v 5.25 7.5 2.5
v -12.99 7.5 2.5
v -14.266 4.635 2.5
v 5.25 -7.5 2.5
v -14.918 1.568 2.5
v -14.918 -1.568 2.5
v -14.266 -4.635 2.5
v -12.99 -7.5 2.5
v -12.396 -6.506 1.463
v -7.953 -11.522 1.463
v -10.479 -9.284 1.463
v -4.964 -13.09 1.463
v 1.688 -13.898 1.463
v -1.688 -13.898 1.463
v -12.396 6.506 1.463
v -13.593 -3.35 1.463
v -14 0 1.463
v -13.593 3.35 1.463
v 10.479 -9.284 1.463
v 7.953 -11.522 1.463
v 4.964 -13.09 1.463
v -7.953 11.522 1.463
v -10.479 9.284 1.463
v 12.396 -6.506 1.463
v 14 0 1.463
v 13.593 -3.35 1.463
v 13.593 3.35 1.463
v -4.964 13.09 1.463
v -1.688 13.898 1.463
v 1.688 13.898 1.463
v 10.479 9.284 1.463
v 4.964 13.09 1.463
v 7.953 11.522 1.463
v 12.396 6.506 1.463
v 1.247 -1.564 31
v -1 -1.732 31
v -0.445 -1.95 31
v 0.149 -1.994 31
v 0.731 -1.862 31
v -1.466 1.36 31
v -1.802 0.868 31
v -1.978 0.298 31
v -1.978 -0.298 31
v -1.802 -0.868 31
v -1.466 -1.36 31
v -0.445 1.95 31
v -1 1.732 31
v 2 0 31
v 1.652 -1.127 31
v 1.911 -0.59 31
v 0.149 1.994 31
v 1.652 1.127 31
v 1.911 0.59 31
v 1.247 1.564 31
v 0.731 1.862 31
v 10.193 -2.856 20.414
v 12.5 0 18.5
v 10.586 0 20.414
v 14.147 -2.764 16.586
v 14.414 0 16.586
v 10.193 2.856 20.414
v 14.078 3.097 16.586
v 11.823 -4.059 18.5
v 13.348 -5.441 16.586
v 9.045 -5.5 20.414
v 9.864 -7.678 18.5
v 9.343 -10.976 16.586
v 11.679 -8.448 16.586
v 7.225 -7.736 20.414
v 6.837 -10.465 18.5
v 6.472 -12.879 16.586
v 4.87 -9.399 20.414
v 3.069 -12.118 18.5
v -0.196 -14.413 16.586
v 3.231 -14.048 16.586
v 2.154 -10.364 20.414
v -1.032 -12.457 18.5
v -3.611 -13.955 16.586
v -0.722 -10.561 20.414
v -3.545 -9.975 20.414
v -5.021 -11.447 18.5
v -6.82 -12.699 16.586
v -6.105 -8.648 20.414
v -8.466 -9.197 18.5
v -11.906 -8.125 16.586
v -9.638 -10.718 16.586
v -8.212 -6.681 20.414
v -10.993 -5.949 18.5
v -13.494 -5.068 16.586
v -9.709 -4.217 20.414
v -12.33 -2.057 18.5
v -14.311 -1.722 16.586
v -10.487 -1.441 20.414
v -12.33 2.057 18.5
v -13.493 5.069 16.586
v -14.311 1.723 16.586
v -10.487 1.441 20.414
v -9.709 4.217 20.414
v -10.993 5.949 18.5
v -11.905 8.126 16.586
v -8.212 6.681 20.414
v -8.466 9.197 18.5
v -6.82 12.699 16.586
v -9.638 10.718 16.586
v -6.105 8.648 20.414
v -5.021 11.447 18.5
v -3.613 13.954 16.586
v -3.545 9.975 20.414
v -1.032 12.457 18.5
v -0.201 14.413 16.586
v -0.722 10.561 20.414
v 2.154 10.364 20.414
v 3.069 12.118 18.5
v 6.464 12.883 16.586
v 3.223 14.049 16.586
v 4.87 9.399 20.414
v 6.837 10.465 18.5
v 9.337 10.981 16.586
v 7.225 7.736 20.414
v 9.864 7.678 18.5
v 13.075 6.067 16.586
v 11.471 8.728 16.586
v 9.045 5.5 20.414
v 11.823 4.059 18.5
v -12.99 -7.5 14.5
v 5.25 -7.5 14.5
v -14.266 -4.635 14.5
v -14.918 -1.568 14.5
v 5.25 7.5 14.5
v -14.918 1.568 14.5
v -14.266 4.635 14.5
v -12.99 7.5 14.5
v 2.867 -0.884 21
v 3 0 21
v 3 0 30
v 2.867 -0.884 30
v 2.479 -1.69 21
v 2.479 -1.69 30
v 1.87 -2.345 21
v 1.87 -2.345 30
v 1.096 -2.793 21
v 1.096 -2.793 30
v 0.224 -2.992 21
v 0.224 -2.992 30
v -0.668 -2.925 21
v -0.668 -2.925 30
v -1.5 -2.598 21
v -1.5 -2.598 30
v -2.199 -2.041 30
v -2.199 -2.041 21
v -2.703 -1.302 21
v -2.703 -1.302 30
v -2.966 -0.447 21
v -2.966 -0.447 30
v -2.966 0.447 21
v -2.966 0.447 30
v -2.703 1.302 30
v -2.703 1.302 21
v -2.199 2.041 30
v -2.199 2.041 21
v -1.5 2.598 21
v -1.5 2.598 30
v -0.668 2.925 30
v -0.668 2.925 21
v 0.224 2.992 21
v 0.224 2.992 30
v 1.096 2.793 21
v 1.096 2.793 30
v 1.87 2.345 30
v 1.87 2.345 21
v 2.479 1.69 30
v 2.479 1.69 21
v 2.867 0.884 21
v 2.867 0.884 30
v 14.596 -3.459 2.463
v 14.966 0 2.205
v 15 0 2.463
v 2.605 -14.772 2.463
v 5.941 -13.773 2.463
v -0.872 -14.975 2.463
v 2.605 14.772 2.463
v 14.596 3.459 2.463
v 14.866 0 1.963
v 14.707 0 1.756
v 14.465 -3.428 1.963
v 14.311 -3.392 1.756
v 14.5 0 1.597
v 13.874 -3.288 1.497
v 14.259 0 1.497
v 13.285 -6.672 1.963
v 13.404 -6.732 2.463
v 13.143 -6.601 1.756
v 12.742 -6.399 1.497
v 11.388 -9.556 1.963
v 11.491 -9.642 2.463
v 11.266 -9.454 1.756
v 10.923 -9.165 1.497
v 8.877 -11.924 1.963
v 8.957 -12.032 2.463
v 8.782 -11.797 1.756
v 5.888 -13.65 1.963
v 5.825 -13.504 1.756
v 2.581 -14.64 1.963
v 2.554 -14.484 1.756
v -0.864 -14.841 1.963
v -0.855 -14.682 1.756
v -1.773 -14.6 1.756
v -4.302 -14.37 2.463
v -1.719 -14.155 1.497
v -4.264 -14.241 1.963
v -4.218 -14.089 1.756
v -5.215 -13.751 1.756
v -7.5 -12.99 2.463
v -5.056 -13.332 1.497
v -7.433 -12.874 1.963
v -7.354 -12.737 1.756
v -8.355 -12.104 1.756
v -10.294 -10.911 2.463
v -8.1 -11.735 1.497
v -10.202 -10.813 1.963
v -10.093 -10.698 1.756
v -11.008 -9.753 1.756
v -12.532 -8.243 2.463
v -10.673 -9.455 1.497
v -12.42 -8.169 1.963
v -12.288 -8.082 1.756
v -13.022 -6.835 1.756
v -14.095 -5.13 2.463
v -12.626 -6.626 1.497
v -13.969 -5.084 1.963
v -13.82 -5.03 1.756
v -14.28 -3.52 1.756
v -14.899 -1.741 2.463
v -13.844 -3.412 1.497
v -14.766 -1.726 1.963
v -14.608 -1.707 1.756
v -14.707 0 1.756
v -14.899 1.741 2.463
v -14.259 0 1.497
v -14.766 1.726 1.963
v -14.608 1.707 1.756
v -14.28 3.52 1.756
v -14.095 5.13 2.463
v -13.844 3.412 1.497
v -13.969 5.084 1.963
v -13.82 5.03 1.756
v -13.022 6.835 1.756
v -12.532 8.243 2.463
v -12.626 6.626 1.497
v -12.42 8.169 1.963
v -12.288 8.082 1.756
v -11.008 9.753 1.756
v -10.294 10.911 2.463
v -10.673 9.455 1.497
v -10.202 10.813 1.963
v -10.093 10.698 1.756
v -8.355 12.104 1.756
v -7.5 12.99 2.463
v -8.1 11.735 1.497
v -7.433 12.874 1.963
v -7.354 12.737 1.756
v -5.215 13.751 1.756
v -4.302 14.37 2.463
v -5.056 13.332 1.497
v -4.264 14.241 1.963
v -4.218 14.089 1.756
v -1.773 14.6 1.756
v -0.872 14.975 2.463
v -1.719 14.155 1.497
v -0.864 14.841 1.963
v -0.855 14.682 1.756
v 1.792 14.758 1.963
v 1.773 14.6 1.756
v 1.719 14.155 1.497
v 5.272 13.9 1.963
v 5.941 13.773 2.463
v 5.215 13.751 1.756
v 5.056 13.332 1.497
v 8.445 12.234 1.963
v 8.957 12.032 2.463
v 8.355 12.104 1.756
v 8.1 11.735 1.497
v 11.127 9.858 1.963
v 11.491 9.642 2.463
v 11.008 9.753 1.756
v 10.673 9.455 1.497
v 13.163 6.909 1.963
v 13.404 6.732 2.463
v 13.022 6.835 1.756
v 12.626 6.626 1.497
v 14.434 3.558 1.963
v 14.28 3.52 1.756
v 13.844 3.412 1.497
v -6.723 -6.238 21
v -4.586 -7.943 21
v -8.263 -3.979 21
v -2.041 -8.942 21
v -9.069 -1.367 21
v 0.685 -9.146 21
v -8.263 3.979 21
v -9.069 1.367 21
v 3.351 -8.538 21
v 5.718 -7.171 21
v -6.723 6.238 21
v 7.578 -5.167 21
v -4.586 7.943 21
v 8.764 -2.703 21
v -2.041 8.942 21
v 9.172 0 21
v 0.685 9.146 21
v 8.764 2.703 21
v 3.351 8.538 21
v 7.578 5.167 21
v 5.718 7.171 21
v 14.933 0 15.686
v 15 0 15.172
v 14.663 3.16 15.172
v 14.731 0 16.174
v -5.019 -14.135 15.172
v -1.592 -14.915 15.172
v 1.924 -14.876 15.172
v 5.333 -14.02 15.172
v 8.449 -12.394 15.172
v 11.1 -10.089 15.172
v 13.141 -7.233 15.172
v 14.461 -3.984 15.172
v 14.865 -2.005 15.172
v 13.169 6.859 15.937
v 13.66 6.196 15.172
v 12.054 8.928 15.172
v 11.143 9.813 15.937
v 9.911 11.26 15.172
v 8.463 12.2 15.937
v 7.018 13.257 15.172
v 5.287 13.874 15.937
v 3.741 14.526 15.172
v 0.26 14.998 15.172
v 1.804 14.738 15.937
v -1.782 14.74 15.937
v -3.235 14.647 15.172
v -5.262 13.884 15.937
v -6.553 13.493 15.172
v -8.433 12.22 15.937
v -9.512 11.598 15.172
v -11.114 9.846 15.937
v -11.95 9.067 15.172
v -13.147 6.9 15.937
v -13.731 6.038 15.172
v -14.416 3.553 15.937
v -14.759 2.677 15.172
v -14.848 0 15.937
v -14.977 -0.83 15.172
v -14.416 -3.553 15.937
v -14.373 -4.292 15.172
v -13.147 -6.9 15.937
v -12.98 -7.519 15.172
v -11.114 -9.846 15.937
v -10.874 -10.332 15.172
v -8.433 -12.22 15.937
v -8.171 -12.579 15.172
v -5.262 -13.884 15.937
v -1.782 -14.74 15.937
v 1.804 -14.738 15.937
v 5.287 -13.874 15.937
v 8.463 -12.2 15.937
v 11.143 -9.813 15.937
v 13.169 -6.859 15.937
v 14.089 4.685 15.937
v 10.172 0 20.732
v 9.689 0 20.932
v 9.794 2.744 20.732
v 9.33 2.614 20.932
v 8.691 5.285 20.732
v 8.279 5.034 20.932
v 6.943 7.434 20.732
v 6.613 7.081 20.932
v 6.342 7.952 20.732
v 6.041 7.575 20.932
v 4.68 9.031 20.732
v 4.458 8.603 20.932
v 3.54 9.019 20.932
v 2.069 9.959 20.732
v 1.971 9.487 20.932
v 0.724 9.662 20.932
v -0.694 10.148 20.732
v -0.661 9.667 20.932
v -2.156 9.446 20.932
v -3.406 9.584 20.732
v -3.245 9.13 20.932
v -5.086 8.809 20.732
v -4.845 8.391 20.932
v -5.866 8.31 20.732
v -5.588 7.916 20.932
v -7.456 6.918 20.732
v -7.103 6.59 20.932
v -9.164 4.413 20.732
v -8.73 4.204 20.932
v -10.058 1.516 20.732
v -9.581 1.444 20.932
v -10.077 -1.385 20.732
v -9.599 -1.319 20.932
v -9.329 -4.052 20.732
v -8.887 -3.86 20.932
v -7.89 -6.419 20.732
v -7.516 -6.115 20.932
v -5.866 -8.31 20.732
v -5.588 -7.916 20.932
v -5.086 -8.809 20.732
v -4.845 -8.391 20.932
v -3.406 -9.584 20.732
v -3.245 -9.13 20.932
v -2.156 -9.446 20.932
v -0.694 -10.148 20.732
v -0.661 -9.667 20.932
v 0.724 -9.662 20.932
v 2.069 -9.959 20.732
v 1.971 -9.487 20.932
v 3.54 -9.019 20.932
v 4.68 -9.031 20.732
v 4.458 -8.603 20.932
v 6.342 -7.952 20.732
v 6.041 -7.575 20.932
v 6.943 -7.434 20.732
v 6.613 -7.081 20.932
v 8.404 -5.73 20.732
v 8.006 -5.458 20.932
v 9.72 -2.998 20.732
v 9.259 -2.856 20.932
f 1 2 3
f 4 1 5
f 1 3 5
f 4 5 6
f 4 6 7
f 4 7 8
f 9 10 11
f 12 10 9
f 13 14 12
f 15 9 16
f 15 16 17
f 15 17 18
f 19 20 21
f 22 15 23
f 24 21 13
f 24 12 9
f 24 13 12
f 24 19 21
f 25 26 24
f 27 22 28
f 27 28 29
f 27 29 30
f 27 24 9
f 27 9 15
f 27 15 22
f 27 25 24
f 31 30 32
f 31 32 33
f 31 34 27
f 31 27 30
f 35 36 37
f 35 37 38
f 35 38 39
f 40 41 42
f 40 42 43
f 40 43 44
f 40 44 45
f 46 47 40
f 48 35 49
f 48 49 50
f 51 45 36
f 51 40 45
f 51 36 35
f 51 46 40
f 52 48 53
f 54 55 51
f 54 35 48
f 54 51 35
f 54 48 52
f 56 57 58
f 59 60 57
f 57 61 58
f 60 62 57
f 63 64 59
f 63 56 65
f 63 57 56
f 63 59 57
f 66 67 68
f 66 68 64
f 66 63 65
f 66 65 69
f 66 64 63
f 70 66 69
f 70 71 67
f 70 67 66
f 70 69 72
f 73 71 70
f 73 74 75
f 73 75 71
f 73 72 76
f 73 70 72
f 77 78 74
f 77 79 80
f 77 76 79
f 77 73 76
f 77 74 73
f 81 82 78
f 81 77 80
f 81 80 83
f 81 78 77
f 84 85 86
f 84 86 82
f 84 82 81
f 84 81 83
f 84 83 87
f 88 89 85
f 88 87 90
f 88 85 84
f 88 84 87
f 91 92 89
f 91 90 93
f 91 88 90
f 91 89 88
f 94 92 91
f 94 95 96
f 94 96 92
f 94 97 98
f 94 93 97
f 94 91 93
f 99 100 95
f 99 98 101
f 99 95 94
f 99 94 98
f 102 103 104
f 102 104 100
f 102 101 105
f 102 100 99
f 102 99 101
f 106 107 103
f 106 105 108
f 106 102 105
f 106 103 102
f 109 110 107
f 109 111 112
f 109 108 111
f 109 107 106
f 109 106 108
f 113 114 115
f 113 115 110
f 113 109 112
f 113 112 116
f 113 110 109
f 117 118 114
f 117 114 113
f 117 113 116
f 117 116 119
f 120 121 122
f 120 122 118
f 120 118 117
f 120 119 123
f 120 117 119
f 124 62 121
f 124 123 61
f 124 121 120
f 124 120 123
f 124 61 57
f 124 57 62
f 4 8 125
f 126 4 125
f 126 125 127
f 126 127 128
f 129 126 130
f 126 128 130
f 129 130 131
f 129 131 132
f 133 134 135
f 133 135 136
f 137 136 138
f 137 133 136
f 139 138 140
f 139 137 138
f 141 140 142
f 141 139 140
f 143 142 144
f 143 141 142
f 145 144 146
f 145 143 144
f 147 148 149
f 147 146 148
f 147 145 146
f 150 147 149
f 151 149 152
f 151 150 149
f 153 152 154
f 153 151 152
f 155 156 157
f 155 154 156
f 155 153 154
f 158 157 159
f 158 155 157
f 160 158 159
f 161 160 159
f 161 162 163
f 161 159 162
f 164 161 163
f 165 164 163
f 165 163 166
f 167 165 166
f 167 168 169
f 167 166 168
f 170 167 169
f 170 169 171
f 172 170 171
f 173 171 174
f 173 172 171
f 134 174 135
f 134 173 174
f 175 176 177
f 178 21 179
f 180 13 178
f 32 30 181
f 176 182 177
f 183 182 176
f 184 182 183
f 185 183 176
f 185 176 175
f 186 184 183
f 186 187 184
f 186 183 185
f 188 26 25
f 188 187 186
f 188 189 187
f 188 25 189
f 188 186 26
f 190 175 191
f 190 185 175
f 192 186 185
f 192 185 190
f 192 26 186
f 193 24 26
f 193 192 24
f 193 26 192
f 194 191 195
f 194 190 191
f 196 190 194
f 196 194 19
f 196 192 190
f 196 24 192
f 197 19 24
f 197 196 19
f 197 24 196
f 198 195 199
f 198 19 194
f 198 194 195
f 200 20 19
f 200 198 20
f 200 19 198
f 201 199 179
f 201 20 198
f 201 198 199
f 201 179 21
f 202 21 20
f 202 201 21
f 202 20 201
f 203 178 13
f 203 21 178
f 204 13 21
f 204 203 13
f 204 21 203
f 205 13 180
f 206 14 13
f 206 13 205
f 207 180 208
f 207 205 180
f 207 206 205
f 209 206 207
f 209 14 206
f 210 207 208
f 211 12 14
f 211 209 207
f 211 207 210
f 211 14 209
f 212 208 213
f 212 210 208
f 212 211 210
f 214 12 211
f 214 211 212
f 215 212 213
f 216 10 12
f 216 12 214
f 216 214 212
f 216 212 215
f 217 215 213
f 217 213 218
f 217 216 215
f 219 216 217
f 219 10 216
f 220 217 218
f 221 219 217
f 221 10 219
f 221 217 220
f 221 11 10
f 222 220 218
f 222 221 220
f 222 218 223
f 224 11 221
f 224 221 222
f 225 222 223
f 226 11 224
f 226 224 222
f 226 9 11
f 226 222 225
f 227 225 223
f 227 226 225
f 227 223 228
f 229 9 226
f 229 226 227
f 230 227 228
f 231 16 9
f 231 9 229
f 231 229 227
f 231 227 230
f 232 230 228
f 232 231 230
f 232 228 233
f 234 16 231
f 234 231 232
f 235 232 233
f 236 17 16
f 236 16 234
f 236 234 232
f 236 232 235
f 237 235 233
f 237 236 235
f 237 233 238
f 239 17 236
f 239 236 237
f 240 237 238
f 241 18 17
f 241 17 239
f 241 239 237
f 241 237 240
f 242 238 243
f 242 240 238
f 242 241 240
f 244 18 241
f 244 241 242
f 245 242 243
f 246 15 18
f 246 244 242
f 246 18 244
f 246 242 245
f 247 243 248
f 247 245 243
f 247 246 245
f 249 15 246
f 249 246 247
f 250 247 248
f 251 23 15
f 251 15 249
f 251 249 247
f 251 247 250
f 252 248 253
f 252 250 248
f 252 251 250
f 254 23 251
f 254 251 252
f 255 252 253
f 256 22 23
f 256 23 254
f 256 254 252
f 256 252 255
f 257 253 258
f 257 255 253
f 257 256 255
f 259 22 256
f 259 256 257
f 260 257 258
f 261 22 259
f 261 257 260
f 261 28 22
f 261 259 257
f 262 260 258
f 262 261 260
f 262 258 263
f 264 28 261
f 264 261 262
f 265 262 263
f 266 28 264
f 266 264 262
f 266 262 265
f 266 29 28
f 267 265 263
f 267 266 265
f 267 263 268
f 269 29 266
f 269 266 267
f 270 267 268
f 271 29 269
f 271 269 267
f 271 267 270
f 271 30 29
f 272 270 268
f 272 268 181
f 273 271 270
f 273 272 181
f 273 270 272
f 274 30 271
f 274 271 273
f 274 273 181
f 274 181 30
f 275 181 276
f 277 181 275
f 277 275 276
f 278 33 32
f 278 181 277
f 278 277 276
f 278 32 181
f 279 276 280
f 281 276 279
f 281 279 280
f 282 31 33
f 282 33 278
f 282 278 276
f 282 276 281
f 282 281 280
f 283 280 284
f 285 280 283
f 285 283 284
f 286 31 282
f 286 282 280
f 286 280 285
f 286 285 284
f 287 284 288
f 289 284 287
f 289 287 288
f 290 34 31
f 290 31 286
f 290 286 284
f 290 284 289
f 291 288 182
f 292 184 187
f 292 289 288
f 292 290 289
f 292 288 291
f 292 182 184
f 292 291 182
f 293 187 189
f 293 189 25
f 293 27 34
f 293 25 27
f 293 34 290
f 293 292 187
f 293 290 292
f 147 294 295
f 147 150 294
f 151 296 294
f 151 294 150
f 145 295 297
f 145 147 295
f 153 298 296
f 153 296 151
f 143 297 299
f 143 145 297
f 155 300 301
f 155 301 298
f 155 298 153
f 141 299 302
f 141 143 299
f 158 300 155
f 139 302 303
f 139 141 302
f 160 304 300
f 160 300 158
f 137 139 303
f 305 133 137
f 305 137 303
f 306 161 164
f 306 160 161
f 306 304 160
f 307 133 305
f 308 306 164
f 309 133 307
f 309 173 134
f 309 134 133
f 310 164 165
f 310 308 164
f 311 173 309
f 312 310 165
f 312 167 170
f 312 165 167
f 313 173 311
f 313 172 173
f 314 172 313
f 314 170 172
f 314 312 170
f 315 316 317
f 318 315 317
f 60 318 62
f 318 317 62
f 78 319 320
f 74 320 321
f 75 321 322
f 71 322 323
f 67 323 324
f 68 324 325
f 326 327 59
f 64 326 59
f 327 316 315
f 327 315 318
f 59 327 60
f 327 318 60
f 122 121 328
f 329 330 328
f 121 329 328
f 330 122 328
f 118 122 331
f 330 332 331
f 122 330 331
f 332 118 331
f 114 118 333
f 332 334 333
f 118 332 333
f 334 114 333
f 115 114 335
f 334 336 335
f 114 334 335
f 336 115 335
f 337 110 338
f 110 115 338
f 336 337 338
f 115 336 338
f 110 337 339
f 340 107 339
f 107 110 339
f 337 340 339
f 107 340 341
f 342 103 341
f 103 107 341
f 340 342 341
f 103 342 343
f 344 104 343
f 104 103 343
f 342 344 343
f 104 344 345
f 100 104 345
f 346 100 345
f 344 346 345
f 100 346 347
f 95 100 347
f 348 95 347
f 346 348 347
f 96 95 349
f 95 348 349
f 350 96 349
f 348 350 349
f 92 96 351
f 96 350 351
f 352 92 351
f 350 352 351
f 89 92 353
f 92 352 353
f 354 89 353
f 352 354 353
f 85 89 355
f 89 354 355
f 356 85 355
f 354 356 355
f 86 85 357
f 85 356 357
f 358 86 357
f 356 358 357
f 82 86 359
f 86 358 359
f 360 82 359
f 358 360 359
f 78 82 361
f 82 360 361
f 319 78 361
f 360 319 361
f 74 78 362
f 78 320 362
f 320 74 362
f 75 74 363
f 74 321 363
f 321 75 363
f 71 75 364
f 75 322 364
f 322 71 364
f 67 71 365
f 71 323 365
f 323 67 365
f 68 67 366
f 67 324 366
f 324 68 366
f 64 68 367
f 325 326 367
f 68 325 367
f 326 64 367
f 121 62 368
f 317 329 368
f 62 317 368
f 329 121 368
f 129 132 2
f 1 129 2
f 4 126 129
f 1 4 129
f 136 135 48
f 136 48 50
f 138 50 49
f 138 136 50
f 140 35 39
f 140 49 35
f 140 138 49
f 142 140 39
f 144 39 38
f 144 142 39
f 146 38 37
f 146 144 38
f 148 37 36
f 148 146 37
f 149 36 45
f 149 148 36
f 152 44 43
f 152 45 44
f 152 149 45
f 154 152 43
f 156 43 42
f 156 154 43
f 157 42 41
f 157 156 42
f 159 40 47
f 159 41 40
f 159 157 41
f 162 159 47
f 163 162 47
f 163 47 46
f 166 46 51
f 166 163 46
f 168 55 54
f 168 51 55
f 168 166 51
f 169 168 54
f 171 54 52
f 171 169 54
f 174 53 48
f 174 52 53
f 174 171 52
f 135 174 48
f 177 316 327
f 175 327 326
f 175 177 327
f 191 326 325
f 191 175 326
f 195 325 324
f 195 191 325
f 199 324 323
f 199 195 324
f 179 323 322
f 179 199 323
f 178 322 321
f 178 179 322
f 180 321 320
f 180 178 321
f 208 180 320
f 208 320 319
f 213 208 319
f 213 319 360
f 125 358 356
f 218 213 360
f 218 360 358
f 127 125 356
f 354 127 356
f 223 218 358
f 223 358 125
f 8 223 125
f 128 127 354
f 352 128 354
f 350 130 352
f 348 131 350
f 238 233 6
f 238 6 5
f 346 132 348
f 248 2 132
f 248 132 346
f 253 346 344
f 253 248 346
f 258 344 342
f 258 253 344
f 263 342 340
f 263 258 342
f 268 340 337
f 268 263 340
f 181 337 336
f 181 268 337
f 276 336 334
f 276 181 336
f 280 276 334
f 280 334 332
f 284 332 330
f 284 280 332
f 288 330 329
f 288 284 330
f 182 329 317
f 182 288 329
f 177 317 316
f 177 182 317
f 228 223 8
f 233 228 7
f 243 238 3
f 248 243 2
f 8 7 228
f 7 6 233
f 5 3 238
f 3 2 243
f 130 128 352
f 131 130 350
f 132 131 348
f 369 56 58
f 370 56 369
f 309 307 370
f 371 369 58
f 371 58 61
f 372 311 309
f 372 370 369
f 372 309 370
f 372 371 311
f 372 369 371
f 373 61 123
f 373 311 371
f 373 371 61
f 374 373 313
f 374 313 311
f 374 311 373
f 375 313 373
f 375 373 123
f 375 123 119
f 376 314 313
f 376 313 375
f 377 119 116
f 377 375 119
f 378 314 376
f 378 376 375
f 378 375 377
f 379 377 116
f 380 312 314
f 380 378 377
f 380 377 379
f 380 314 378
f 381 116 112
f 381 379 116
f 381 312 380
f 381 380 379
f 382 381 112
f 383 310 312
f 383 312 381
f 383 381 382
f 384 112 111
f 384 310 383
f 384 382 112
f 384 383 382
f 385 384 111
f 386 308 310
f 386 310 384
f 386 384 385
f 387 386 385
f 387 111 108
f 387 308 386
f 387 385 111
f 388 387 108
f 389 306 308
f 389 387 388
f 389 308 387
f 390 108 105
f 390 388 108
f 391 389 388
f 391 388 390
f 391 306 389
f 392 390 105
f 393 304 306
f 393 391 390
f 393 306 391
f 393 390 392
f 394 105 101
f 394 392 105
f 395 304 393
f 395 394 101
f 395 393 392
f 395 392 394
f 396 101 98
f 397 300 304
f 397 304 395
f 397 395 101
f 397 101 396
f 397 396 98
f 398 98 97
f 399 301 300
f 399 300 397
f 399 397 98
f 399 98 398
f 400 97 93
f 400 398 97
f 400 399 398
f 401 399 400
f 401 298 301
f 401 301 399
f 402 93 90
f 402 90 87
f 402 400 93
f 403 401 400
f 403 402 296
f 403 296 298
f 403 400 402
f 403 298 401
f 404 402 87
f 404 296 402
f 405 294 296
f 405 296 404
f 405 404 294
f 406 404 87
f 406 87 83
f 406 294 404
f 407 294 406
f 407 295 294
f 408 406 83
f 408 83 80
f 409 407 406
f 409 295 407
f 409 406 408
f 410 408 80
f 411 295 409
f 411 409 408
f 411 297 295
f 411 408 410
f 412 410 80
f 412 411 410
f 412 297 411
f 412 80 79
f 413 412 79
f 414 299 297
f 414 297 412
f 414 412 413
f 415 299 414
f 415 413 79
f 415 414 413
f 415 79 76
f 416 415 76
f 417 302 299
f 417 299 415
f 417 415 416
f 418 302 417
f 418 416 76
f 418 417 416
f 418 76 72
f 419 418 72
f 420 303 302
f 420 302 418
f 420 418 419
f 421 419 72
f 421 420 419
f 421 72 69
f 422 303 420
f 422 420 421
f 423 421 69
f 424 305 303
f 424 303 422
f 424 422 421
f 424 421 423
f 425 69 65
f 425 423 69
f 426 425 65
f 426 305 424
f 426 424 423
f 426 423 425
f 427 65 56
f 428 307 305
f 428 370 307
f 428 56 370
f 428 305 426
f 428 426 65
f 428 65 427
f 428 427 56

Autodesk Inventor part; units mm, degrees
ref_plane "XY Plane" through (0, 0, 0) normal (0, 0, 1) x (1, 0, 0)
sketch "Sketch1" plane through (0, 0, 0) normal (0, 0, 1) x (1, 0, 0)
  circle A0 centre (0, 0) radius 15
  dimension "d0" = 30
extrude "Extrusion1" add sketch "Sketch1" along normal blind 20
sketch "Sketch3" plane through (0, 0, 20) normal (0, 0, 1) x (1, 0, 0)
  circle A0 centre (0, 0) radius 15
extrude "Extrusion3" add sketch "Sketch3" along normal blind 1
chamfer "Chamfer1" distance 5 angle 45 1 edges at (-15, 0, 21)
fillet "Fillet1" radius 2 2 edges at (-15, 0, 16) (-10, 0, 21)
sketch "Sketch4" plane through (0, 0, 21) normal (0, 0, 1) x (1, 0, 0)
  circle A0 centre (0, 0) radius 3
  dimension "d12" = 6
extrude "Extrusion4" add sketch "Sketch4" along normal blind 10
chamfer "Chamfer2" distance 1 angle 45 1 edges at (-3, 0, 31)
fillet "Fillet2" radius 1 1 edges at (-15, 0, 0)
ref_plane "Work Plane2" through (0, 14.5, 0) normal (0, 1, 0) x (-1, 0, 0)
ref_plane "Work Plane1" through (0, -15.5, 0) normal (0, 1, 0) x (-1, 0, 0)
ref_plane "Work Plane3" through (-14.75, 0, 0) normal (1, 0, 0) x (0, 1, 0)
sketch "Sketch5" plane through (-14.75, 0, 0) normal (1, 0, 0) x (0, 1, 0)
  line L0 (7.5, 2.5) -> (-7.5, 2.5)
  line L1 (-7.5, 2.5) -> (-7.5, 14.5)
  line L2 (-7.5, 14.5) -> (7.5, 14.5)
  line L3 (7.5, 14.5) -> (7.5, 2.5)
  line L4 (9.8328, 18.3373) -> (9.8328, 18.1192)
  line L5 (7.5, 12.0972) -> (7.5, 12.3154)
  line L6 (-15, 1) -> (15, 1) projected
  line L7 (15, 1) -> (15, 15.1716) projected
  line L8 (-15, 1) -> (15, 1)
  line L9 (15, 1) -> (15, 15.1716)
  line L10 (15, 15.1716) -> (-15, 15.1716)
  line L11 (-15, 15.1716) -> (-15, 1)
  line L12 (15, 15.1716) -> (-15, 15.1716) projected
  point P0 (0, 0)
  dimension "d28" = 15
  dimension "d29" = 12
  dimension "d30" = 7.5
  dimension "d31" = 7.5
  dimension "d32" = 1.5
  dimension "d34" = 0
extrude "Extrusion5" cut sketch "Sketch5" along normal blind 20 and the other way blind 5 contours L0 L1 L2 L3
thread "Thread1" size "M6x1" class "6g" standard "ANSI Metric M Profile" full length
sketch "Sketch6" plane through (5.25, 0, 0) normal (-1, 0, 0) x (0, 0, 1)
  line L0 (0, -16.1407) -> (1.4634, -16.1407)
  line L1 (1.4634, -16.1407) -> (1.4634, 17.2598)
  line L2 (1.4634, 17.2598) -> (0, 17.2598)
  line L3 (0, 17.2598) -> (0, -16.1407)
  point P0 (0, 0)
extrude "Extrusion6" cut sketch "Sketch6" along normal through all both and the other way through all
fillet "Fillet3" radius 1 1 edges at (-15, 0, 1.4634)
properties part number "Motor" material "UHMW, Black"
